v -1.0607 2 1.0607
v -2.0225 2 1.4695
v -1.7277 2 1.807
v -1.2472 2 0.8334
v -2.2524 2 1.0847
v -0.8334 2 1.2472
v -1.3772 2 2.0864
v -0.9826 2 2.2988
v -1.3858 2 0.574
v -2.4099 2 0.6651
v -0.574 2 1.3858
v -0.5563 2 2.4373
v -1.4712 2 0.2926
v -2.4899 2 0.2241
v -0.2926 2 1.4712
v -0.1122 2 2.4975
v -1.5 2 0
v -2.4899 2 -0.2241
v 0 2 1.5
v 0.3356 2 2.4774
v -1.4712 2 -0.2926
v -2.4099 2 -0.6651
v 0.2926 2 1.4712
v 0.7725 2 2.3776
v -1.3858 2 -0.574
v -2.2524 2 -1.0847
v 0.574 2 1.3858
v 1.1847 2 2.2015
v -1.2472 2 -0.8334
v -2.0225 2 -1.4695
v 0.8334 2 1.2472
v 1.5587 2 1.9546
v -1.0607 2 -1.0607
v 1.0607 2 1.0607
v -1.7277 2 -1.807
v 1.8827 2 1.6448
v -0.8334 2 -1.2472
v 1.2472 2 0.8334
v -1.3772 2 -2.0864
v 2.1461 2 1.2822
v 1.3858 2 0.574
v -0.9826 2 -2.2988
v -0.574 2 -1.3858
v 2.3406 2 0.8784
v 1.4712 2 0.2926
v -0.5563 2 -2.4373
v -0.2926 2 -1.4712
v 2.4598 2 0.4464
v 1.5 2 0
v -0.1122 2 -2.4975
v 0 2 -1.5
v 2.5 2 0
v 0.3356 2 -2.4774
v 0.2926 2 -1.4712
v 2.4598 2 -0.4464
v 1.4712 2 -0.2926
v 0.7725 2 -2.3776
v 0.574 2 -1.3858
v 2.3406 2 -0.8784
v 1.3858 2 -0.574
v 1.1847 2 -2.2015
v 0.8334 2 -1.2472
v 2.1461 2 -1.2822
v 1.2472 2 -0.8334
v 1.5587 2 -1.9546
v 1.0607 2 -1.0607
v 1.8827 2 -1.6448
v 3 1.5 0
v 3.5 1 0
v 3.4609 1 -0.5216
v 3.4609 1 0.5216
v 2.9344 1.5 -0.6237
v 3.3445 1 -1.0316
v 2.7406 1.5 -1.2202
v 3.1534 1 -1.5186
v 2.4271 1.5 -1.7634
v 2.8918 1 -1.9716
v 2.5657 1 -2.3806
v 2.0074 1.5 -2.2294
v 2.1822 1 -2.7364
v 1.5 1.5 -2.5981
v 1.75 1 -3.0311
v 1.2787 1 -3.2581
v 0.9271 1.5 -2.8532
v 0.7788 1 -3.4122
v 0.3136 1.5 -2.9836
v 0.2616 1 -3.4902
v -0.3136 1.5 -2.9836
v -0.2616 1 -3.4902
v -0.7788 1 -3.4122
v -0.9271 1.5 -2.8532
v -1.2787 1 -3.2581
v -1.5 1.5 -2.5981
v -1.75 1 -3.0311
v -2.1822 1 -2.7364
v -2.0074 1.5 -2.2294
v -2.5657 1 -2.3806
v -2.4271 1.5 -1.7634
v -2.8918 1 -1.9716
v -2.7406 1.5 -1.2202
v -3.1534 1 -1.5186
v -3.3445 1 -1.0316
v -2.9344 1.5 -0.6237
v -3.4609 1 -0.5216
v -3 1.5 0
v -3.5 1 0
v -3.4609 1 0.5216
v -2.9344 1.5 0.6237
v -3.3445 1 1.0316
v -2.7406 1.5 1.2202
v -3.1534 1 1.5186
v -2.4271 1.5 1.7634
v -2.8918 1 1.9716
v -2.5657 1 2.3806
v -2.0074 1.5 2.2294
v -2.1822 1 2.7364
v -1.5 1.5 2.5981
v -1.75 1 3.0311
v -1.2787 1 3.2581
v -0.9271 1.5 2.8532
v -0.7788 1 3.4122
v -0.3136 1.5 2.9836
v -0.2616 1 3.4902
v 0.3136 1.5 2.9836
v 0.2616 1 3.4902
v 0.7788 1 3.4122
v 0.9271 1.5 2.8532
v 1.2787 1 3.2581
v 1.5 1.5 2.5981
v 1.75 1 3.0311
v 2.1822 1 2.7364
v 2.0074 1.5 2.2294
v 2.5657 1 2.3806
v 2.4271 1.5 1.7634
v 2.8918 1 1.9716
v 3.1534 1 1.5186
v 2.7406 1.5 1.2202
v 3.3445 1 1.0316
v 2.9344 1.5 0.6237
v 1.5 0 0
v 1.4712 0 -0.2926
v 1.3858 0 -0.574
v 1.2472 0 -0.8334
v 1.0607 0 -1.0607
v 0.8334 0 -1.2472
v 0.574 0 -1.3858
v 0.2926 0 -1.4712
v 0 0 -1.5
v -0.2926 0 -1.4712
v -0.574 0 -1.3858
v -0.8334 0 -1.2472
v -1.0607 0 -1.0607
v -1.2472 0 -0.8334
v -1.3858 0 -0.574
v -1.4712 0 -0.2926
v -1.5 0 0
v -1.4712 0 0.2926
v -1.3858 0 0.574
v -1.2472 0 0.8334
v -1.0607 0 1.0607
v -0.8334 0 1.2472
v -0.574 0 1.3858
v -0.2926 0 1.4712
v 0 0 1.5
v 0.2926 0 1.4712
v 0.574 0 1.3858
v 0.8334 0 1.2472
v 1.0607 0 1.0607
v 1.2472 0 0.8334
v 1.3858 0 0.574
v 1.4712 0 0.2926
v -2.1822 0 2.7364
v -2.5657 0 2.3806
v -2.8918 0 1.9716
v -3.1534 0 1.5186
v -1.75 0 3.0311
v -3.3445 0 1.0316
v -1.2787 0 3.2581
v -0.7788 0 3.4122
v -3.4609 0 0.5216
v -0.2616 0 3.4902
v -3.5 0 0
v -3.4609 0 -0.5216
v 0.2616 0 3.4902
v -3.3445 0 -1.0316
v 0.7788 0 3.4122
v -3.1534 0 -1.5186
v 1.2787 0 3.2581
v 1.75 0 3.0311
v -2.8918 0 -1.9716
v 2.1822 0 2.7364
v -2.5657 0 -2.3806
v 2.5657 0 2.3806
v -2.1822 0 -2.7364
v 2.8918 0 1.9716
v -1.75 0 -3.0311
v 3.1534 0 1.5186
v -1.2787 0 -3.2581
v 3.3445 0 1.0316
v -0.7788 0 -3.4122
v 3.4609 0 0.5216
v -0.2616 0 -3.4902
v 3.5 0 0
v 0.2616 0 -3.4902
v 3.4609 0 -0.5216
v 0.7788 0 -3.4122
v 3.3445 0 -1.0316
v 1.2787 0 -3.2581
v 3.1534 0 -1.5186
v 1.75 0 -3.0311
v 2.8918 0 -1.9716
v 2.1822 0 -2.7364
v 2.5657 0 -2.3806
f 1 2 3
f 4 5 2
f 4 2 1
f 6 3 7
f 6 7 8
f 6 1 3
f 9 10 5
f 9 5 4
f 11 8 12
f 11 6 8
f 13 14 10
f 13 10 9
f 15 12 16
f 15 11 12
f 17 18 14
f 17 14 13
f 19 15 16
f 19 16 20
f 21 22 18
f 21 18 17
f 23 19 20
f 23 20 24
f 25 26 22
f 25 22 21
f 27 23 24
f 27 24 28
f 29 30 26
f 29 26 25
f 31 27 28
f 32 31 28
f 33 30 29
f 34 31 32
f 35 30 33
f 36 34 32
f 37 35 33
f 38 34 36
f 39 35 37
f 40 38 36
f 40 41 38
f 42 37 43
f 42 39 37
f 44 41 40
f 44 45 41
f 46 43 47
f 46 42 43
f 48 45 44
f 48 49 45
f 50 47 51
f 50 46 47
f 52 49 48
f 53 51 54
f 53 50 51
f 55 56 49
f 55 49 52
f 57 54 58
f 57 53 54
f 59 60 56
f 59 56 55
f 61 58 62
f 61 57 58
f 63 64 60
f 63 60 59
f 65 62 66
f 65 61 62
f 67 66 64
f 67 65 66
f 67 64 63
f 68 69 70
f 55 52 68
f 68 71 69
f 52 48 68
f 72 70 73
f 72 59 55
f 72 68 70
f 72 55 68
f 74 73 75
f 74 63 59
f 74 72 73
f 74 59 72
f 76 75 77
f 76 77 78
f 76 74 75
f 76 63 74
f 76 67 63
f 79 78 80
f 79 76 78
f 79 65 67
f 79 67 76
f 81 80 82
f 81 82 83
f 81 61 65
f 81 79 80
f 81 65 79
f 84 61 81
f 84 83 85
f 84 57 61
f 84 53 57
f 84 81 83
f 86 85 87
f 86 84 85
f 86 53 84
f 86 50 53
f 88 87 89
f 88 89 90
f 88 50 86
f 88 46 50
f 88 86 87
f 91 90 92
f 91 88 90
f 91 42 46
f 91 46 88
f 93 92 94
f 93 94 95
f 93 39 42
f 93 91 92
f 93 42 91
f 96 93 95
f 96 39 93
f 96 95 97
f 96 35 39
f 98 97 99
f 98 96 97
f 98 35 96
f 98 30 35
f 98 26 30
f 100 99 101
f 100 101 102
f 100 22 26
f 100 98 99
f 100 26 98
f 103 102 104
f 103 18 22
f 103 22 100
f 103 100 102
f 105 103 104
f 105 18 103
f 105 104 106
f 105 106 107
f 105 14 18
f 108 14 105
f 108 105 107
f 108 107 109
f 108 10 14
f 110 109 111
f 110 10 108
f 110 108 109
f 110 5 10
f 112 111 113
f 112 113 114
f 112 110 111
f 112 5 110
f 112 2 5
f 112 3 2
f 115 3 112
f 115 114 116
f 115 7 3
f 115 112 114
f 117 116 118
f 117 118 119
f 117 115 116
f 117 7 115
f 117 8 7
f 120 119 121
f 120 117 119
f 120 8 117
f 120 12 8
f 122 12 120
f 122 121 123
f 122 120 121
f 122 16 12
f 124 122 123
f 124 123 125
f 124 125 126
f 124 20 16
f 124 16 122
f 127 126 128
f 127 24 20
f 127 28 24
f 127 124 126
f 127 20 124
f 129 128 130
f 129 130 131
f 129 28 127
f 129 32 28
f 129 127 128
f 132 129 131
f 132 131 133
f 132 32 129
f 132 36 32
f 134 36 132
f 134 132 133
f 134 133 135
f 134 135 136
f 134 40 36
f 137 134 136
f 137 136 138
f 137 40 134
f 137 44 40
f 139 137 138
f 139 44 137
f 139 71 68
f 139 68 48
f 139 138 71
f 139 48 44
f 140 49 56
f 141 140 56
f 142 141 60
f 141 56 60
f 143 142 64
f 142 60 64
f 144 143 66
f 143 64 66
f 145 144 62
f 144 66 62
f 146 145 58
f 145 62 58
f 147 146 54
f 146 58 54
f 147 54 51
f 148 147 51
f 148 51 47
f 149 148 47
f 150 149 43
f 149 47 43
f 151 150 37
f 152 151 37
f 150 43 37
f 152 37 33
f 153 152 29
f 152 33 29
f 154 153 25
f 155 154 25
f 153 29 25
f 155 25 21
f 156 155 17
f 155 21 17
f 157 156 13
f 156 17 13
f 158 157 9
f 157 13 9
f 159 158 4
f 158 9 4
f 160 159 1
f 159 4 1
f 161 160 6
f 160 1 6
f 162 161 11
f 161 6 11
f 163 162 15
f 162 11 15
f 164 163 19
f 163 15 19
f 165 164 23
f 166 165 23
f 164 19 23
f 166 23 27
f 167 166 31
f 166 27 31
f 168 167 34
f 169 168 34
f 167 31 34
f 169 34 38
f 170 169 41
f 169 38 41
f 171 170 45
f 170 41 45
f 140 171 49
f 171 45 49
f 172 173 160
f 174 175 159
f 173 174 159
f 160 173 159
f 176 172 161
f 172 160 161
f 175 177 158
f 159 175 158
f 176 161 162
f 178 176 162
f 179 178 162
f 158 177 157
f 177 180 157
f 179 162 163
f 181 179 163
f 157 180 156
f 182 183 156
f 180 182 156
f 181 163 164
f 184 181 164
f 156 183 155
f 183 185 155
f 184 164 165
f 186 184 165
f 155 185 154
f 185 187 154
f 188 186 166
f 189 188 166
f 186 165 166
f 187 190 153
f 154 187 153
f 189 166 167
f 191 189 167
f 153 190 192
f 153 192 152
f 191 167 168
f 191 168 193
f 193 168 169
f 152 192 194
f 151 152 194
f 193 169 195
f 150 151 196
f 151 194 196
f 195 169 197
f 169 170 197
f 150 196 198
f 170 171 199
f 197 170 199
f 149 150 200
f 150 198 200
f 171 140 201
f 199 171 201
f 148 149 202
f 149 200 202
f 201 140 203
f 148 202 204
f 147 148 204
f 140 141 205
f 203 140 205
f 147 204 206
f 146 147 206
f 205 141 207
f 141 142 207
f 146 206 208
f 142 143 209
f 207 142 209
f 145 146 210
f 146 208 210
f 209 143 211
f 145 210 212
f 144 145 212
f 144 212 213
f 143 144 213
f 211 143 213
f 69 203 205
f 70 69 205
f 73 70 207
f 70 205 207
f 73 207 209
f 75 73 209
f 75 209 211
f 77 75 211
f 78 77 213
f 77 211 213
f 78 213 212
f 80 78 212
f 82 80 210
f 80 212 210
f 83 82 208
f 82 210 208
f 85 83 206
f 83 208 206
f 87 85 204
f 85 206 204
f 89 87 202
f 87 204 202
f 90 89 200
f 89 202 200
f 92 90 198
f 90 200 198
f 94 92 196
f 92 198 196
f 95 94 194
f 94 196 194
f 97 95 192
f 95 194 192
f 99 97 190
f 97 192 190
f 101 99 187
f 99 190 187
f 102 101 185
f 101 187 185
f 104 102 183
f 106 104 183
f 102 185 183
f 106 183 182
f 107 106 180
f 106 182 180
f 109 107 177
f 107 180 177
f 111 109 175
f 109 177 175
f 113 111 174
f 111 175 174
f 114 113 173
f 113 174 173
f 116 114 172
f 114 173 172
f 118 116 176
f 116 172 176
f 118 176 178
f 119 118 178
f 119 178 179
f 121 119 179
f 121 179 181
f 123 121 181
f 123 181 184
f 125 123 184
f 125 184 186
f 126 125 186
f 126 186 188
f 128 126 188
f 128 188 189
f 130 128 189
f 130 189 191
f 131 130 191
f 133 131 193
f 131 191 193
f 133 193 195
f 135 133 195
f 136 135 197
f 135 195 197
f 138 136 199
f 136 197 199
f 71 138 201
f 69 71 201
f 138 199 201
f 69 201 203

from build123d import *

# Parameters (mm, degrees)
SKETCH1_R           = 3.5
BOSS_EXTRUDE1_DEPTH = 2
CHAMFER1_SIZE       = 1
SKETCH2_R           = 1.5
CUT_EXTRUDE1_DEPTH  = 2


with BuildPart() as part:
    # Sketch1 → Boss-Extrude1 (new body)
    with BuildSketch(Plane(origin=(0, 0, 0), x_dir=(1, 0, 0), z_dir=(0, 1, 0))):
        Circle(SKETCH1_R)
    extrude(amount=BOSS_EXTRUDE1_DEPTH)

    # Chamfer1
    chamfer1_edges = [part.edges().sort_by_distance(p)[0] for p in [
        (-3.5, 2, 0),
    ]]
    chamfer(chamfer1_edges, length=CHAMFER1_SIZE)

    # Sketch2 → Cut-Extrude1 (cut)
    with BuildSketch(Plane(origin=(0, 2, 0), x_dir=(1, 0, 0), z_dir=(0, 1, 0))):
        Circle(SKETCH2_R)
    extrude(amount=-CUT_EXTRUDE1_DEPTH, mode=Mode.SUBTRACT)


solid = part.part
